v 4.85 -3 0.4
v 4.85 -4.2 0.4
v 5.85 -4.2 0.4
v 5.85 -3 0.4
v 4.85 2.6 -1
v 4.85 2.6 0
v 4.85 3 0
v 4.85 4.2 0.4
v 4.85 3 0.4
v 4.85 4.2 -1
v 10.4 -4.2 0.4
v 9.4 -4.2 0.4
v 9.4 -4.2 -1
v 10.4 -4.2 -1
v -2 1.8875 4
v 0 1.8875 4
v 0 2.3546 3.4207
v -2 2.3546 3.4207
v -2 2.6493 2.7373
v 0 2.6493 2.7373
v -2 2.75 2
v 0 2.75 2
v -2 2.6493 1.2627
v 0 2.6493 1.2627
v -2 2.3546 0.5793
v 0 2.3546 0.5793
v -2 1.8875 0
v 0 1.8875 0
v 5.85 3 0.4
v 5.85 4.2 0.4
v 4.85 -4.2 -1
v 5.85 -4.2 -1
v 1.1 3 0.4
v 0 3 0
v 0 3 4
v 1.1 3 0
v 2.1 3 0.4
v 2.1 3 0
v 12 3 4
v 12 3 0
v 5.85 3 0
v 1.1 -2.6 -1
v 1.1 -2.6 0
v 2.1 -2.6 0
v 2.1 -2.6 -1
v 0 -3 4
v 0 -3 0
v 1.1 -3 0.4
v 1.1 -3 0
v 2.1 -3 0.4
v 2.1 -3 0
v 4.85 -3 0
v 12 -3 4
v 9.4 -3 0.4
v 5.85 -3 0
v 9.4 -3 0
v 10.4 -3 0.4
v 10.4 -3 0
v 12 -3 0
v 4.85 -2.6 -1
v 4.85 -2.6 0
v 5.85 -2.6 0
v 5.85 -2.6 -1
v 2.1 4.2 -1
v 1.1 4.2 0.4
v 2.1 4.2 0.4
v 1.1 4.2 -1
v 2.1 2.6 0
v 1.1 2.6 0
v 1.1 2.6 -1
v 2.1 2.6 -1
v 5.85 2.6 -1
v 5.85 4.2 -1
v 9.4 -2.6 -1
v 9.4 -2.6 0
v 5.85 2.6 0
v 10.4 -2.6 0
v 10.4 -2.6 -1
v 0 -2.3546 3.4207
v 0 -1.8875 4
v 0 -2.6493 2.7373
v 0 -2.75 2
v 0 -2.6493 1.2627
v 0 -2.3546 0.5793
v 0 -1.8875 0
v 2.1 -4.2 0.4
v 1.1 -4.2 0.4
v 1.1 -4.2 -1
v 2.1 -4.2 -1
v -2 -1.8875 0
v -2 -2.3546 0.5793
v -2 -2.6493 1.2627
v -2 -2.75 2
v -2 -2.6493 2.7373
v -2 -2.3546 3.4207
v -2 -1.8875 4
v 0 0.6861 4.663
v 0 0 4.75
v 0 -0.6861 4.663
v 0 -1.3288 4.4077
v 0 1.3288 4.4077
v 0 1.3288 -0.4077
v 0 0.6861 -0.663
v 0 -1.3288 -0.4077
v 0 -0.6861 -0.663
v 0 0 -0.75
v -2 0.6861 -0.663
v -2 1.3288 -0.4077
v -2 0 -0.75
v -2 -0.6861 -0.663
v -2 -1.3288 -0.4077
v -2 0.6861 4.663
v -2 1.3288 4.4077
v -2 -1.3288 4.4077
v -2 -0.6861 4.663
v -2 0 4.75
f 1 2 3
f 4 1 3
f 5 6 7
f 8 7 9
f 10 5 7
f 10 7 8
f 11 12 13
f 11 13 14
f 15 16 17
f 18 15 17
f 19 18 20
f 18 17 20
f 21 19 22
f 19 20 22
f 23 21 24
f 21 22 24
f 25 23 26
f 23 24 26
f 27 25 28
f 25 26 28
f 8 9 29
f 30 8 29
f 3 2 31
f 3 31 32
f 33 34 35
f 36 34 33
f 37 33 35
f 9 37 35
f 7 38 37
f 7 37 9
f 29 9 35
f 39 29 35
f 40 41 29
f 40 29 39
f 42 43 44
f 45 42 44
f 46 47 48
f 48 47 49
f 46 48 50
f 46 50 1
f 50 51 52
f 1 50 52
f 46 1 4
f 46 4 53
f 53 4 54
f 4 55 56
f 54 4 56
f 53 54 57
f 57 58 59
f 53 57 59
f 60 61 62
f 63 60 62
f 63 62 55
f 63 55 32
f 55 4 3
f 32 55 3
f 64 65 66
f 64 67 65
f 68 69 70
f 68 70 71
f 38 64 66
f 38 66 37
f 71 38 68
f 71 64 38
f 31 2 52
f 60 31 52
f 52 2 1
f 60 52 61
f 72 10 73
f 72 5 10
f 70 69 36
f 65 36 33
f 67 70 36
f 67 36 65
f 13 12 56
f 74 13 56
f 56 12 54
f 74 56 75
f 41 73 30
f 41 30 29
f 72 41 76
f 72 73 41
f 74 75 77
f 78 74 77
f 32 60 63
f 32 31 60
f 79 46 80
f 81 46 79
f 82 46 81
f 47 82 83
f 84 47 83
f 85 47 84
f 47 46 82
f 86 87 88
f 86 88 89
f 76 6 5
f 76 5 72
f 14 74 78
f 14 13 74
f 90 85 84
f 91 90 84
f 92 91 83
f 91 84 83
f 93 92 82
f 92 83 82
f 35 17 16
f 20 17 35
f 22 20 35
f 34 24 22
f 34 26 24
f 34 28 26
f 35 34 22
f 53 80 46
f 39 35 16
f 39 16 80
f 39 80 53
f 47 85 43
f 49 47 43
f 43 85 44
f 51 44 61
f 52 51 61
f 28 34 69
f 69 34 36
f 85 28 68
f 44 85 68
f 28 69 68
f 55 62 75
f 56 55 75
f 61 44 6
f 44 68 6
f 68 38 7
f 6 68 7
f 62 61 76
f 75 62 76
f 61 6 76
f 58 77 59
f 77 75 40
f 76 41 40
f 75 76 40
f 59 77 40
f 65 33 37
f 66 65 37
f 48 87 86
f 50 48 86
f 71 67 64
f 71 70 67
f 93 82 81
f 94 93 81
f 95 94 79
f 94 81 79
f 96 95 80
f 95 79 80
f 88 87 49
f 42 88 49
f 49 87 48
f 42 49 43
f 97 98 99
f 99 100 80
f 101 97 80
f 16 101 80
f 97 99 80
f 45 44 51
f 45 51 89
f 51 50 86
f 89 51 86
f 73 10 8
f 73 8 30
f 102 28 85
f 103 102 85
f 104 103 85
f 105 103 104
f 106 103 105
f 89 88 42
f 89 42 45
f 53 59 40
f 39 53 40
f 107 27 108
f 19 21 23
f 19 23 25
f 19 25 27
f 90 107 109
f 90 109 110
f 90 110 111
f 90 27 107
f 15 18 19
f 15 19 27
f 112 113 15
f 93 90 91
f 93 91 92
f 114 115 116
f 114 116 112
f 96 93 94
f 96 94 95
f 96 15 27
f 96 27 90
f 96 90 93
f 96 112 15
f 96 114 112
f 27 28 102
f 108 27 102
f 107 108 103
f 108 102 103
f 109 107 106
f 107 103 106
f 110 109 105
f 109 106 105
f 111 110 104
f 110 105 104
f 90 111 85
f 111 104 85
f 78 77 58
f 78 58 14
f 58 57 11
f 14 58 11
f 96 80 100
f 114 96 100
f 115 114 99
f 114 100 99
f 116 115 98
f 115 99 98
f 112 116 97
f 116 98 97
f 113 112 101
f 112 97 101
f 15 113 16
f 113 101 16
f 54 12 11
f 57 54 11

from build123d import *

# Parameters (mm, degrees)
F0_W          = 12
F0_H          = 6
F1_DEPTH      = 4
F3_DEPTH      = 2
F4_W          = 1
F4_H          = 1.2
F4_H_2        = 0.4
F5_DEPTH      = 1
F5_DEPTH_BACK = 0.4


with BuildPart() as f1:
    # F0 (on Top) → F1 (new body)
    with BuildSketch(Plane.XY):
        with Locations((6, 0)):
            Rectangle(F0_W, F0_H)
    extrude(amount=F1_DEPTH)

    # F2 (on face) → F3 (join)
    with BuildSketch(Plane(origin=(0, 0, 0), x_dir=(0, -1, 0), z_dir=(-1, 0, 0))):
        with BuildLine():
            ThreePointArc((1.8874586088, 0), (2.5251743677, 0.910966294), (2.75, 2))
            ThreePointArc((2.75, 2), (2.5251743677, 3.089033706), (1.8874586088, 4))
            Line((1.8874586088, 4), (-1.8874586088, 4))
            ThreePointArc((-1.8874586088, 4), (-2.75, 2), (-1.8874586088, 0))
            Line((-1.8874586088, 0), (1.8874586088, 0))
        make_face()
        with BuildLine():
            Line((-1.8874586088, 4), (1.8874586088, 4))
            ThreePointArc((1.8874586088, 4), (0, 4.75), (-1.8874586088, 4))
        make_face()
        with BuildLine():
            ThreePointArc((-1.8874586088, 0), (0, -0.75), (1.8874586088, 0))
            Line((1.8874586088, 0), (-1.8874586088, 0))
        make_face()
    extrude(amount=F3_DEPTH)

    # F4 (on face) → F5 (join, two sides)
    with BuildSketch(Plane(origin=(0, 0, 0), x_dir=(1, 0, 0), z_dir=(0, 0, -1))) as f5_sk:
        with Locations((1.6, -3.6)):
            Rectangle(F4_W, F4_H)
        with Locations((1.6, 3.6)):
            Rectangle(F4_W, F4_H)
        with Locations((1.6, 2.8)):
            Rectangle(F4_W, F4_H_2)
        with Locations((5.35, 2.8)):
            Rectangle(F4_W, F4_H_2)
        with Locations((5.35, 3.6)):
            Rectangle(F4_W, F4_H)
        with Locations((1.6, -2.8)):
            Rectangle(F4_W, F4_H_2)
        with Locations((5.35, -3.6)):
            Rectangle(F4_W, F4_H)
        with Locations((5.35, -2.8)):
            Rectangle(F4_W, F4_H_2)
        with Locations((9.9, 2.8)):
            Rectangle(F4_W, F4_H_2)
        with Locations((9.9, 3.6)):
            Rectangle(F4_W, F4_H)
    extrude(amount=F5_DEPTH)
    extrude(f5_sk.sketch, amount=-F5_DEPTH_BACK)


solid = f1.part
